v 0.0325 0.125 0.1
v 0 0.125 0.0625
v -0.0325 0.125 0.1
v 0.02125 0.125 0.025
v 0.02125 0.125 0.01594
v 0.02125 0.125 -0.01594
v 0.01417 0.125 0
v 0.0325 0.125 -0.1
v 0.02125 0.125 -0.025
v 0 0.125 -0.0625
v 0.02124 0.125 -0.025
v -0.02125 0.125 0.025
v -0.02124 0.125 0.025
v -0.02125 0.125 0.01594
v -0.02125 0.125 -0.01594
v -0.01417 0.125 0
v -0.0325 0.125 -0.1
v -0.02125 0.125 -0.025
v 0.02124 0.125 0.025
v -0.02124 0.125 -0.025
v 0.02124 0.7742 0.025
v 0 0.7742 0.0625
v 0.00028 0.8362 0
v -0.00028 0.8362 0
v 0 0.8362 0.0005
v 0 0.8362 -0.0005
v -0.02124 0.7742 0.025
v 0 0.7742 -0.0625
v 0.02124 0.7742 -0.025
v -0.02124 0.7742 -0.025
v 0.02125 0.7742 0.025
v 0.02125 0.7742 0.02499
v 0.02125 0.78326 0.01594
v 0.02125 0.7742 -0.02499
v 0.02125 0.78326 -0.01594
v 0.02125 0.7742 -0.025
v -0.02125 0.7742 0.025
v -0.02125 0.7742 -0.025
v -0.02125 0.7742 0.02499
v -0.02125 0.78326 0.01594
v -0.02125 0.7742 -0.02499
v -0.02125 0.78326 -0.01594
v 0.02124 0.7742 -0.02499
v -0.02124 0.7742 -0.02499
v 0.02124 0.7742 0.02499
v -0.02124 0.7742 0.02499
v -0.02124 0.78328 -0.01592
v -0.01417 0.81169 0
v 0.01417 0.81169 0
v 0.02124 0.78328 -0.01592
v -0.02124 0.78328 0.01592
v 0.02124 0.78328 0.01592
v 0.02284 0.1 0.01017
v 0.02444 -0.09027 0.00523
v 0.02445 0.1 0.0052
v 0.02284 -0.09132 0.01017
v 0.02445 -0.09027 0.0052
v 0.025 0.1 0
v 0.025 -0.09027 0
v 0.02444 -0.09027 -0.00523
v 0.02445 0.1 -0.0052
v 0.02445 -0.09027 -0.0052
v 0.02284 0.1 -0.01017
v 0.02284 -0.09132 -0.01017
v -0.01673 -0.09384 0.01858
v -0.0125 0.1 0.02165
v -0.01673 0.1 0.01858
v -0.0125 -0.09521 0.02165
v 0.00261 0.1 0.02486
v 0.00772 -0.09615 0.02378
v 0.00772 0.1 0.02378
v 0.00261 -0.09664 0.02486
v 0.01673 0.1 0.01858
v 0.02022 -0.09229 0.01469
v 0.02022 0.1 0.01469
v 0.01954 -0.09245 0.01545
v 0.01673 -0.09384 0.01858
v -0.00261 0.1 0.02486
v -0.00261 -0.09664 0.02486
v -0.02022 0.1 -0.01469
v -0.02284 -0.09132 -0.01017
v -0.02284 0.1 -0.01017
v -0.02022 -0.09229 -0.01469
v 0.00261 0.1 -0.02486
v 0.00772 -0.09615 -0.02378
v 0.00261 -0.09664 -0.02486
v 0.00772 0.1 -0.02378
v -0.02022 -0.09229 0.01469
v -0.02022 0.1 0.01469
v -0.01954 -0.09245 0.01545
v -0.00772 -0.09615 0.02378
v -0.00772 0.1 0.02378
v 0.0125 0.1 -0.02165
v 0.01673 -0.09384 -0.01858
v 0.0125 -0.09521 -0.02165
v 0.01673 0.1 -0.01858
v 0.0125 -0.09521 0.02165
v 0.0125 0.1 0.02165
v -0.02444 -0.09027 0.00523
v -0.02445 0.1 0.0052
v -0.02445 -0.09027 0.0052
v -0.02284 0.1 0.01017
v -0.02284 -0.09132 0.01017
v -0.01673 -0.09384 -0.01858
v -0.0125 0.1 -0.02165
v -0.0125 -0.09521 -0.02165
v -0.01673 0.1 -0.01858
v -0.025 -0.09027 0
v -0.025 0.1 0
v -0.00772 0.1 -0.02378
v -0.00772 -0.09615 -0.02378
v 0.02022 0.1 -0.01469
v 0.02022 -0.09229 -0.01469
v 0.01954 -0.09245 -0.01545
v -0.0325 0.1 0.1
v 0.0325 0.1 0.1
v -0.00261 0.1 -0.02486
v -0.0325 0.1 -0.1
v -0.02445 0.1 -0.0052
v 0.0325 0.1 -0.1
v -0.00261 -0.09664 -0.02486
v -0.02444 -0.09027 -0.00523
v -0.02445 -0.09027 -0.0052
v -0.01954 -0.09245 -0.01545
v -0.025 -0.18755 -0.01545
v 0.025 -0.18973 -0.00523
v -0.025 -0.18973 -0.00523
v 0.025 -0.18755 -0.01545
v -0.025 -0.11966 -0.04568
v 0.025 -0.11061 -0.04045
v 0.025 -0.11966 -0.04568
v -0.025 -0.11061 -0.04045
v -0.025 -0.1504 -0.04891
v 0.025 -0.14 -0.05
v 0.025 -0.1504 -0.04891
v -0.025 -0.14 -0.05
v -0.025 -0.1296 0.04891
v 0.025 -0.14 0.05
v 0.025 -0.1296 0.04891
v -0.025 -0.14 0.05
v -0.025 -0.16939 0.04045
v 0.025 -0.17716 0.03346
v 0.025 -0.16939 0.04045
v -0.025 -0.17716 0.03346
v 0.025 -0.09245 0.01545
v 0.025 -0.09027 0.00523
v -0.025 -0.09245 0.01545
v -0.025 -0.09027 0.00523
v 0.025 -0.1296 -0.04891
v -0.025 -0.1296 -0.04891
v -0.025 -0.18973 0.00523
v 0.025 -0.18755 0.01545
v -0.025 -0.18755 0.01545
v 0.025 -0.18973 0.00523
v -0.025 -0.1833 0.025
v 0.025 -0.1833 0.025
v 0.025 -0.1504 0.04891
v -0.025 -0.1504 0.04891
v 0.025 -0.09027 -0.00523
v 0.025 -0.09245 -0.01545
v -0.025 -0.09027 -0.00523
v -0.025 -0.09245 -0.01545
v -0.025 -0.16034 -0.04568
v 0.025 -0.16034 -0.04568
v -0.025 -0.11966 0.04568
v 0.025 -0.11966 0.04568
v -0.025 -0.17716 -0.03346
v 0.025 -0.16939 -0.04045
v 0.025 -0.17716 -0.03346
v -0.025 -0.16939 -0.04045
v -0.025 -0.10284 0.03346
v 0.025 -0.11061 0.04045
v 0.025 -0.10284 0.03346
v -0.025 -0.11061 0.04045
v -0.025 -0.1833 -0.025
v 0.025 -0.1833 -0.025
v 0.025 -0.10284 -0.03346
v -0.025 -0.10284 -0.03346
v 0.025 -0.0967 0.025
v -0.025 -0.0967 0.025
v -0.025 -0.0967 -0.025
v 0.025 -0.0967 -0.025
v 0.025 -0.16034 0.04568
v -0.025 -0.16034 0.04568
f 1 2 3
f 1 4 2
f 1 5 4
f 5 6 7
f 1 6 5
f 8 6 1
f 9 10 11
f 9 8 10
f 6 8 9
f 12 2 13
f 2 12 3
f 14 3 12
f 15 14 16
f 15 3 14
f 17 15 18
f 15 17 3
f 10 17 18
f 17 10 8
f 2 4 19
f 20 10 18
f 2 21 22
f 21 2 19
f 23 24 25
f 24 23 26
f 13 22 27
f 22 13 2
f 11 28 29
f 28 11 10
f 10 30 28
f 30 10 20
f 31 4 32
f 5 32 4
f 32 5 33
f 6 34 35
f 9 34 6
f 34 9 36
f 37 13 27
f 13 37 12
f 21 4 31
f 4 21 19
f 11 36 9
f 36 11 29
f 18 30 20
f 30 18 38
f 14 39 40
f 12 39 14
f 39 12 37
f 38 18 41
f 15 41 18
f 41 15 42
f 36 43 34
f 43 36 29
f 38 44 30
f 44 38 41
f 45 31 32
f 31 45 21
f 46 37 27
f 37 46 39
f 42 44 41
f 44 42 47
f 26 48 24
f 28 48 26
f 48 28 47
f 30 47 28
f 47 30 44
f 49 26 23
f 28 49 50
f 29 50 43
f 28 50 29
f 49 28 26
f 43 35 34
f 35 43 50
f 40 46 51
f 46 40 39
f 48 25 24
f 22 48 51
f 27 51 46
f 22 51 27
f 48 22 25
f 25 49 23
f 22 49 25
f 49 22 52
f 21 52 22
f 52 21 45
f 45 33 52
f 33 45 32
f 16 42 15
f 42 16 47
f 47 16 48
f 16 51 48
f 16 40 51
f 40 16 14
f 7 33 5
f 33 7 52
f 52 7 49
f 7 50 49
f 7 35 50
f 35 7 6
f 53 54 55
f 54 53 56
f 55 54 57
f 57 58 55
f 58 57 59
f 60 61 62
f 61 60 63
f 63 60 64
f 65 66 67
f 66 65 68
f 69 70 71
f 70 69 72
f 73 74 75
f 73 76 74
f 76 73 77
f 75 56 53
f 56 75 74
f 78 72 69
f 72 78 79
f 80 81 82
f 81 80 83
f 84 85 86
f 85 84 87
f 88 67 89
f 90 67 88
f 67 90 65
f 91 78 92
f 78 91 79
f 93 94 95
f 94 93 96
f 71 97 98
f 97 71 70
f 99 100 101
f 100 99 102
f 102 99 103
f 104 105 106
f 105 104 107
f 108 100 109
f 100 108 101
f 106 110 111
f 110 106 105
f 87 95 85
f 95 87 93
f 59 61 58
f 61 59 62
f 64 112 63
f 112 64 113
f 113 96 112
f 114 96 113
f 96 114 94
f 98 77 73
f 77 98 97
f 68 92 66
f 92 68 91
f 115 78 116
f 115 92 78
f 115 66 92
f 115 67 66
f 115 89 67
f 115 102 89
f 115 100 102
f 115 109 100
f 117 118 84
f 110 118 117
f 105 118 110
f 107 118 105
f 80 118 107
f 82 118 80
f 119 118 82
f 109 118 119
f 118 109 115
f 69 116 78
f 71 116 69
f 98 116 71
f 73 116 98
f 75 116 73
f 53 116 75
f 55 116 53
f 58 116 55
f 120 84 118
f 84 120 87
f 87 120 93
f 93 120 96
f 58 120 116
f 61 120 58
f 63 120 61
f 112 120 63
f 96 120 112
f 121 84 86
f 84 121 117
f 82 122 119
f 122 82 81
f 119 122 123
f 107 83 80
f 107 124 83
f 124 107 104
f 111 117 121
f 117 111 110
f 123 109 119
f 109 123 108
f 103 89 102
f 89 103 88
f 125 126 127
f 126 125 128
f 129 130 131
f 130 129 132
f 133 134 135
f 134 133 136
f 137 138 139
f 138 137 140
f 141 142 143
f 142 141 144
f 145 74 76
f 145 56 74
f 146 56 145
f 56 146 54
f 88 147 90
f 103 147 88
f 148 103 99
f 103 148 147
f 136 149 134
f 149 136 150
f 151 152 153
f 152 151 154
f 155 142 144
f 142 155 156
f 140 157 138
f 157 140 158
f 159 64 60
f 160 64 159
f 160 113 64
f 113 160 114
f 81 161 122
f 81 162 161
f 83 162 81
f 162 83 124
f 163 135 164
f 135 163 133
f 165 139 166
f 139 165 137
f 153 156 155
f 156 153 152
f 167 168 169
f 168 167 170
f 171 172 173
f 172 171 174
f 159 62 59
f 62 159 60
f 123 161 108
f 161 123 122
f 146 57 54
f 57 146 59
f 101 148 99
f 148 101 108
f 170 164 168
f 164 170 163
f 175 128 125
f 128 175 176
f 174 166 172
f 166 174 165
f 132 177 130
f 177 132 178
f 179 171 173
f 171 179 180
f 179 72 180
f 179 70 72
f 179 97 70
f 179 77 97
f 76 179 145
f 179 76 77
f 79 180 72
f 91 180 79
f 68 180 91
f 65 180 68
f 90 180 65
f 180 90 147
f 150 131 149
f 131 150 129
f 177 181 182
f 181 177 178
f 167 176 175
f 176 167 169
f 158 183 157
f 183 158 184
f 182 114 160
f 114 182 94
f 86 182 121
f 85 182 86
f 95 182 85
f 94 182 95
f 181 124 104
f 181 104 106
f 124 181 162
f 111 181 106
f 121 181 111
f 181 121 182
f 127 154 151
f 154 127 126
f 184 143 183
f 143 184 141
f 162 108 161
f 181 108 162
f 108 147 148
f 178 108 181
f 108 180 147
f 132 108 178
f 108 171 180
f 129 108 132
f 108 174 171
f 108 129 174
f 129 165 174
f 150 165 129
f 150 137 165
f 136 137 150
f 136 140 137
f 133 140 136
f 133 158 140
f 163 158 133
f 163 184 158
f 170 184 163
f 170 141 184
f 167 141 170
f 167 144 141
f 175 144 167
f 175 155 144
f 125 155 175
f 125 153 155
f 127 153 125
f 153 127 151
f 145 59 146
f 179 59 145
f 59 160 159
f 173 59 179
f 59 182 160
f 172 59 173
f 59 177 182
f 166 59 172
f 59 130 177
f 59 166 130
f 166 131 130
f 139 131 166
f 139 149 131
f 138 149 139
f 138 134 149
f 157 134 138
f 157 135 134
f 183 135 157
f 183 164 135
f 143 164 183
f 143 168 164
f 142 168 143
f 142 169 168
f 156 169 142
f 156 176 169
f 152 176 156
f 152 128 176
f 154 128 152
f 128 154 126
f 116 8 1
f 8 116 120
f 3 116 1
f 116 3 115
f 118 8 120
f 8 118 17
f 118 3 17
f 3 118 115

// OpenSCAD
/*
    Apparently, there is a great body of work (deemed typology) that covers
    what swords looked like at specific periods and the transitions between
    different styles of sword. Given the technology level we're going for, we
    should really go for a style of sword that reflects the (European) late
    medieval to early renaissance period.
    
    However, I really don't feel like doing that so I'm just going to mix and
    match whatever I feel like until it looks like a sword.
*/
/*
    Our sword has the following components:
        
        - Pommel, the cap at the end of the grip
        
        - Grip, the handle
        
        - Guard, bar to protect the hand
        
        - Blade, the actual content/matter of the sword. We're gonna go with a
          hexagonal cross section, since that's what will be the easiest to
          model. The blade will also feature a fuller, which is a sort of
          groove that slips through the matter of the blade and apparently
          makes it lighter or something; here it will mostly add visual texture
          to the blade. The blade has several subcomponents:
          - The Edge, the honed edges of the blade
          - The Tip, the blade and the edges shaped into a curve
          - The Fuller, a groove in the blade that serves to lighten the
            blade but here will mostly serve to give the blade some sense of 
            texture.
*/
/*
    To help keep things consistent, we'll define a set of constants and re-use
    them throughout.
    
    Here are some constants that AREN'T defined:
        - The length of the blade extends on the X axis.
        - The width of the blade extends up-and-down on the Z axis, meaning
          the sword is effectively mirrored across the X-Y plane.
        - The thickness of the blade is on the Y axis.
        - The model's origin is the middle of the grip. This is done to make
          posing and rotations with another model very easy.
    
    All constants are in world units.
*/
// How long is the grip? Since this is a short sword, it should match the
// hand height/width of the intended user.
GRIP_LENGTH = 0.2;
// The grip is a cylinder. What's the radius of that cylinder?
GRIP_RADIUS = 0.025;
// We need to specify how many faces the grip has. How many faces does it
// have?
GRIP_FACES = 30;

// The pommel is a flattened disc - in other words, a FAT cylinder. What's
// the thickness of the pommel?
POMMEL_THICKNESS = 0.05;
// What's the radius of the pommel-disc?
POMMEL_RADIUS = 0.05;
// We need to specify how many faces the pommel has. How many faces does
// it have?
POMMEL_FACES = 30;
// We try and position the pommel so it's tangent with the grip. This might
// not actually look good, so this constant allows us to shift the grip
// forward or backward.
POMMEL_Y_SHIFT = 0.01;

// How thick is the hand/cross guard? In other words, length on X.
GUARD_THICKNESS = .065;
// How long is the guard along the length of the sword? In other words, how
// long on Y?
GUARD_LENGTH = .025;
// How wide is the guard? In other words, how long on Z?
GUARD_WIDTH = .2;

// How long is the blade, base to tip? This was based on a kind of complex
// calculation - we currently have a Pawn model thats ~1.57 world units
// tall. World units are 1:1 with meters, so we can convert this to about 62
// inches, or 5'2". The blade enthusiasts of the world (in this case,
// shopwushu.com) have ACTUAL SIZE RECOMMENDATION CHARTS for blade length,
// so we can check against that and get a recommended length of 28 inches,
// which translates to 0.7112 meters.
BLADE_LENGTH = 0.7112;
// How thick is the blade - how long is the length on X?
BLADE_THICKNESS = .0425;
// How wide is the blade - how long is the length on Z?
BLADE_WIDTH = 0.125;

// How wide is the edge of the blade? Keep in mind that the edge appears on
// all sides of the blade, but this value only measures the edge at any one
// given point.
EDGE_WIDTH = .0375;

// Carving a tip with an edge is actually surprisingly complicated, and not
// as precise as we would necessarily want. The technique involves creating
// a complex carving structure, and then using difference to carve said tip.

// The inset controls where the tip is carved - there's some wiggle room
// forward or backward. Negative values move the tip towards the
// guard/grip/pommel.
TIP_INSET = -EDGE_WIDTH * 2 + .013;
// We use a rotation-extrusion to create the carver. How many faces make up
// the rotation-extrusion? More faces will result in a more circular curve.
TIP_CARVER_FACES = 5;

// The width of the fuller
FULLER_WIDTH = EDGE_WIDTH * 0.85;
// The depth of the fuller, on either side of the blade. Too deep and the blade
// will become a two-pronged poker!
FULLER_DEPTH = BLADE_THICKNESS / 6;
// The fuller is carved using a cylinder. How many faces does that cylinder have?
// More faces means a smoother, more circular fuller.
FULLER_FACES = 4;

// The GRIP
module grip(){
    rotate([90, 0, 0])
    cylinder(h=GRIP_LENGTH, r=GRIP_RADIUS, center=true, $fn=GRIP_FACES);
}
//

// The POMMEL
module pommel(){
    translate([0, (-GRIP_LENGTH / 2) - POMMEL_RADIUS + POMMEL_Y_SHIFT, 0])
    rotate([0, 90, 0])
    cylinder(h=POMMEL_THICKNESS, r=POMMEL_RADIUS, center=true, $fn=POMMEL_FACES);
}
//

// The GUARD
module guard(){
    translate([0, (GRIP_LENGTH / 2) + (GUARD_LENGTH / 2), 0])
    cube(size=[GUARD_THICKNESS, GUARD_LENGTH, GUARD_WIDTH], center=true);
}
//

// The BLADE
module edge_shape(){
    
    X_OUTER_POINT = BLADE_WIDTH / 2;
    X_INNER_POINT = (BLADE_WIDTH / 2) - EDGE_WIDTH;
    
    translate([0, GRIP_LENGTH / 2 + GUARD_LENGTH, 0])
    rotate([0, 90, 90])
    union(){
        // Left (-X) side
        linear_extrude(height = BLADE_LENGTH, center = false)
        polygon(
            points =[
                [-X_OUTER_POINT, 0],
                [-X_INNER_POINT,  BLADE_THICKNESS / 2],
                [-X_INNER_POINT, -BLADE_THICKNESS / 2]
            ],
            paths = [[0, 1, 2]],
            convexity = 10
        );
        // Right (+X) side
        linear_extrude(height = BLADE_LENGTH, center = false)
        polygon(
            points =[
                [X_OUTER_POINT, 0],
                [X_INNER_POINT,  BLADE_THICKNESS / 2],
                [X_INNER_POINT, -BLADE_THICKNESS / 2]
            ],
            paths = [[0, 1, 2]],
            convexity = 10
        );
    }
}
module core_blade(){
    union(){//
        translate([0, (GRIP_LENGTH / 2) + GUARD_LENGTH + (BLADE_LENGTH / 2), 0])
        cube(
            size=[BLADE_THICKNESS, BLADE_LENGTH, BLADE_WIDTH - (EDGE_WIDTH * 2)],
            center=true
        );
        edge_shape();
    }
   
}
module tip_carver(){
    X_OUTER_POINT = BLADE_WIDTH / 2;
    X_INNER_POINT = (BLADE_WIDTH / 2) - EDGE_WIDTH;
    
    translate([0, TIP_INSET, 0])
    translate([0, (GRIP_LENGTH / 2) + GUARD_LENGTH + BLADE_LENGTH, 0])
    rotate([0, 90, 0])
    rotate_extrude(angle = 180, $fn=TIP_CARVER_FACES)
    polygon(
        points =[
            // Shape 01: Rectangle that's way too big
            [X_OUTER_POINT * 2,  BLADE_THICKNESS],
            [X_INNER_POINT,  BLADE_THICKNESS],
            [X_INNER_POINT, -BLADE_THICKNESS],
            [X_OUTER_POINT * 2, -BLADE_THICKNESS],
            // Shape 02: Normal triangle points
            [X_OUTER_POINT,  BLADE_THICKNESS / 2], //4
            [X_INNER_POINT,  BLADE_THICKNESS / 2],
            [X_INNER_POINT, -BLADE_THICKNESS / 2],
            [X_OUTER_POINT, -BLADE_THICKNESS / 2],
            [X_OUTER_POINT, 0],
        ],
        // Build out the rectangle and extract the small triangle
        paths = [[0, 1, 2, 3], [5, 6, 8]],
        convexity = 10
    );
}
module fuller_carver(){
    translate([0, (GRIP_LENGTH / 2) + GUARD_LENGTH, 0])
    rotate([-90, 90, 0])
    union(){
        translate([0, BLADE_THICKNESS / 2, 0])
        scale([FULLER_WIDTH, FULLER_DEPTH * 2, BLADE_LENGTH])
        cylinder(h=1, r=0.5, $fn=FULLER_FACES);
        translate([0, -BLADE_THICKNESS / 2, 0])
        scale([FULLER_WIDTH, FULLER_DEPTH * 2, BLADE_LENGTH])
        cylinder(h=1, r=0.5, $fn=FULLER_FACES);
    }
}
module complete_blade(){
    difference(){
        difference(){
            core_blade();
            tip_carver();
        }
        fuller_carver();
    }
}
//

grip();
pommel();
guard();
complete_blade();
//fuller_carver();
//tip_carver();
